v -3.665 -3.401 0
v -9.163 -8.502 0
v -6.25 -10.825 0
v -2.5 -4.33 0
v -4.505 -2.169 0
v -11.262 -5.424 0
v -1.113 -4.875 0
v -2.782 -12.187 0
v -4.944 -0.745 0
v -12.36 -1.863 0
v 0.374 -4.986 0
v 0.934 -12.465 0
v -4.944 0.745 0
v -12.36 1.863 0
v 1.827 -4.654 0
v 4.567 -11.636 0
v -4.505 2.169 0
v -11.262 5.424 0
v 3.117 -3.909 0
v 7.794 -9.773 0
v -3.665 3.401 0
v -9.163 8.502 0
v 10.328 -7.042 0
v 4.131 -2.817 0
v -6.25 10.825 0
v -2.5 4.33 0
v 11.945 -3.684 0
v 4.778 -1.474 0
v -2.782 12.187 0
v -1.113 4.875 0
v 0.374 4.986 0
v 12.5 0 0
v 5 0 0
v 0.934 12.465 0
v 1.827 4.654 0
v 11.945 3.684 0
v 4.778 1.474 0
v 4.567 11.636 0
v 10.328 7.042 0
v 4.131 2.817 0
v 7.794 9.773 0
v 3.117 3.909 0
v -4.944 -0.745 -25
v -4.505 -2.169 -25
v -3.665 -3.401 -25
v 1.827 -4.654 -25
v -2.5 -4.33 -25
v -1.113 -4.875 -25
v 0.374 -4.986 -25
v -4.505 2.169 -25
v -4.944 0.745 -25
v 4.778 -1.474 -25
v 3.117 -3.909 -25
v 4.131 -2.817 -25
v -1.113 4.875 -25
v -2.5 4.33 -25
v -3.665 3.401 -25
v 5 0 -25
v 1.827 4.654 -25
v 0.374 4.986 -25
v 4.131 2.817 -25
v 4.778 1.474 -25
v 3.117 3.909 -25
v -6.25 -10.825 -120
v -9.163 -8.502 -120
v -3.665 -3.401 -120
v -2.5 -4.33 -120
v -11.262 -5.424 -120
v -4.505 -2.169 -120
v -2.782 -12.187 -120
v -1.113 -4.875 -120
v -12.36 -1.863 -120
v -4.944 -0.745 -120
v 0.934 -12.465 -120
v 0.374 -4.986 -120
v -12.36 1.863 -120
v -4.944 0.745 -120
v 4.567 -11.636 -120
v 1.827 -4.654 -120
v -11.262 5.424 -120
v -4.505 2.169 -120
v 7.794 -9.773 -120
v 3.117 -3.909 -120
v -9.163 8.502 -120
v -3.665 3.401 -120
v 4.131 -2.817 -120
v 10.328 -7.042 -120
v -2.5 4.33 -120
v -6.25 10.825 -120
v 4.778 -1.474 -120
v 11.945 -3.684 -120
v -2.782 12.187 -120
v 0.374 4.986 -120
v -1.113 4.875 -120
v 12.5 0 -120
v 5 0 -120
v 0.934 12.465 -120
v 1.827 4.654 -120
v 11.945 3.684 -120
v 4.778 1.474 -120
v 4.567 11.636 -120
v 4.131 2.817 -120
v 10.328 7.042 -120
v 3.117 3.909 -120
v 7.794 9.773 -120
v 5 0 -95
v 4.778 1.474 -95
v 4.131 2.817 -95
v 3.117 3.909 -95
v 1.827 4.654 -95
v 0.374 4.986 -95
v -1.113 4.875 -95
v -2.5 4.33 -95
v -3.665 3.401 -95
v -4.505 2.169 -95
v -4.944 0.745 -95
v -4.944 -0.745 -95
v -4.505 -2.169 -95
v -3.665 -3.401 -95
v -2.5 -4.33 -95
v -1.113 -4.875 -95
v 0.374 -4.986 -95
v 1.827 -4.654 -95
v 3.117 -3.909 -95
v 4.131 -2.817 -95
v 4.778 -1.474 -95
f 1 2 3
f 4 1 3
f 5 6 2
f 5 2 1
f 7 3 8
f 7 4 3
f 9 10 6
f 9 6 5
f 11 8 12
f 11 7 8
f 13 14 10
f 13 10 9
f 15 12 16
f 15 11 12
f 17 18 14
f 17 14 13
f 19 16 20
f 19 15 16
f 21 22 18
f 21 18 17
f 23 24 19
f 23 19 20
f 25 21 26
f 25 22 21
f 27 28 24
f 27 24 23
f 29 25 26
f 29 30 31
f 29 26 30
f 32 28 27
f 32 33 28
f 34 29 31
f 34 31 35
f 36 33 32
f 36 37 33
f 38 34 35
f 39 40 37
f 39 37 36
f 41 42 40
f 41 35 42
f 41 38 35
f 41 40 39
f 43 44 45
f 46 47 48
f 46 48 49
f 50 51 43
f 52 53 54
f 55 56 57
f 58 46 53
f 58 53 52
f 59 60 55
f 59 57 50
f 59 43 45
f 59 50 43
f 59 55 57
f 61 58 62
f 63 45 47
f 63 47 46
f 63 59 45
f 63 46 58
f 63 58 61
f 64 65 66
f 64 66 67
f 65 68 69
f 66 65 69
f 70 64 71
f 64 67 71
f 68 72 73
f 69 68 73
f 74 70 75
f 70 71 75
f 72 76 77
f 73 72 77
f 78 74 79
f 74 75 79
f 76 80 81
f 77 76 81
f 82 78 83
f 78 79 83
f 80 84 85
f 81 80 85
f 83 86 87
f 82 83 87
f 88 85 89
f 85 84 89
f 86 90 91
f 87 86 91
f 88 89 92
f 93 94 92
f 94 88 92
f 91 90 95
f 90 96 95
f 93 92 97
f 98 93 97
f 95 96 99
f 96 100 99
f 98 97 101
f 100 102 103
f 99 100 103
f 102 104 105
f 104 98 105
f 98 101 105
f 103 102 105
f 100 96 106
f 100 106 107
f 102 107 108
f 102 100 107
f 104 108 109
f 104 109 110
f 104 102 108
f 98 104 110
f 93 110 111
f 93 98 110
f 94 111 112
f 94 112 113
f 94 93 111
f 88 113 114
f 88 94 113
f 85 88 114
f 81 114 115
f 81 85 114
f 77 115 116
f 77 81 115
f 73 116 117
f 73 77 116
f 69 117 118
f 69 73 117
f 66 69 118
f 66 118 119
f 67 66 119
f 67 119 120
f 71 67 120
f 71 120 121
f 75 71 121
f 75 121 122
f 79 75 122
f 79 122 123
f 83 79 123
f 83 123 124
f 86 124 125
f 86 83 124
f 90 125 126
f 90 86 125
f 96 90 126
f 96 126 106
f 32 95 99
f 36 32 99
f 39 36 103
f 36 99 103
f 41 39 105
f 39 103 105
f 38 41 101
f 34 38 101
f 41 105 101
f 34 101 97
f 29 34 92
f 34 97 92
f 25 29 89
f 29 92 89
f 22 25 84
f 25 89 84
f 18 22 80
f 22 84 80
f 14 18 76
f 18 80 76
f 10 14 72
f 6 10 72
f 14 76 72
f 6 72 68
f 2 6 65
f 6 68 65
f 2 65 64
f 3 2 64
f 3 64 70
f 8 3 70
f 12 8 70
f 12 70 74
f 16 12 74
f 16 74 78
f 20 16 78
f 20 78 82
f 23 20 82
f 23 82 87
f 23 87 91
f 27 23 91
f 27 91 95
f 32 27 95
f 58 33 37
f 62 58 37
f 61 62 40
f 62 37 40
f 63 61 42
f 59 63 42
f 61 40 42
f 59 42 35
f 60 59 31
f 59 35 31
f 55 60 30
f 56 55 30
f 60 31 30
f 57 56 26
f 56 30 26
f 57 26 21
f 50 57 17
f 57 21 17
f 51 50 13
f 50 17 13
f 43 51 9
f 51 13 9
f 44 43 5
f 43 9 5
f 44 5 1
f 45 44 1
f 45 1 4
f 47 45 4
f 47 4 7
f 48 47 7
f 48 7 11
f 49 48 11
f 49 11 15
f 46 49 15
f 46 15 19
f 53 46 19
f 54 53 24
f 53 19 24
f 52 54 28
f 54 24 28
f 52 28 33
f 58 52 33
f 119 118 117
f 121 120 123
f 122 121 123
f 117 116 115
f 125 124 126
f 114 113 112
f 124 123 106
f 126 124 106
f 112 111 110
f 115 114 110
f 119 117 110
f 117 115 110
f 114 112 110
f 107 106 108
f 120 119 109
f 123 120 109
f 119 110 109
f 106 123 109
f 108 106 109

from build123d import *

# Parameters (mm, degrees)
F0_R     = 12.5
F0_R_2   = 5
F1_DEPTH = 60
F2_DEPTH = 25


with BuildPart() as f1:
    # F0 (on Top) → F1 (new body)
    with BuildSketch(Plane.XY):
        Circle(F0_R)
        Circle(F0_R_2, mode=Mode.SUBTRACT)
        Circle(F0_R_2)
    extrude(amount=-F1_DEPTH)

    # F0 (on Top) → F2 (cut)
    with BuildSketch(Plane.XY):
        Circle(F0_R_2)
    extrude(amount=-F2_DEPTH, mode=Mode.SUBTRACT)

    # F3: F1 across face


with BuildPart() as f1_1:
    add(f1.part)
    add(f1.part.mirror(Plane(origin=(0, 0, -60), x_dir=(1, 0, 0), z_dir=(0, 0, -1))))


solid = f1_1.part
